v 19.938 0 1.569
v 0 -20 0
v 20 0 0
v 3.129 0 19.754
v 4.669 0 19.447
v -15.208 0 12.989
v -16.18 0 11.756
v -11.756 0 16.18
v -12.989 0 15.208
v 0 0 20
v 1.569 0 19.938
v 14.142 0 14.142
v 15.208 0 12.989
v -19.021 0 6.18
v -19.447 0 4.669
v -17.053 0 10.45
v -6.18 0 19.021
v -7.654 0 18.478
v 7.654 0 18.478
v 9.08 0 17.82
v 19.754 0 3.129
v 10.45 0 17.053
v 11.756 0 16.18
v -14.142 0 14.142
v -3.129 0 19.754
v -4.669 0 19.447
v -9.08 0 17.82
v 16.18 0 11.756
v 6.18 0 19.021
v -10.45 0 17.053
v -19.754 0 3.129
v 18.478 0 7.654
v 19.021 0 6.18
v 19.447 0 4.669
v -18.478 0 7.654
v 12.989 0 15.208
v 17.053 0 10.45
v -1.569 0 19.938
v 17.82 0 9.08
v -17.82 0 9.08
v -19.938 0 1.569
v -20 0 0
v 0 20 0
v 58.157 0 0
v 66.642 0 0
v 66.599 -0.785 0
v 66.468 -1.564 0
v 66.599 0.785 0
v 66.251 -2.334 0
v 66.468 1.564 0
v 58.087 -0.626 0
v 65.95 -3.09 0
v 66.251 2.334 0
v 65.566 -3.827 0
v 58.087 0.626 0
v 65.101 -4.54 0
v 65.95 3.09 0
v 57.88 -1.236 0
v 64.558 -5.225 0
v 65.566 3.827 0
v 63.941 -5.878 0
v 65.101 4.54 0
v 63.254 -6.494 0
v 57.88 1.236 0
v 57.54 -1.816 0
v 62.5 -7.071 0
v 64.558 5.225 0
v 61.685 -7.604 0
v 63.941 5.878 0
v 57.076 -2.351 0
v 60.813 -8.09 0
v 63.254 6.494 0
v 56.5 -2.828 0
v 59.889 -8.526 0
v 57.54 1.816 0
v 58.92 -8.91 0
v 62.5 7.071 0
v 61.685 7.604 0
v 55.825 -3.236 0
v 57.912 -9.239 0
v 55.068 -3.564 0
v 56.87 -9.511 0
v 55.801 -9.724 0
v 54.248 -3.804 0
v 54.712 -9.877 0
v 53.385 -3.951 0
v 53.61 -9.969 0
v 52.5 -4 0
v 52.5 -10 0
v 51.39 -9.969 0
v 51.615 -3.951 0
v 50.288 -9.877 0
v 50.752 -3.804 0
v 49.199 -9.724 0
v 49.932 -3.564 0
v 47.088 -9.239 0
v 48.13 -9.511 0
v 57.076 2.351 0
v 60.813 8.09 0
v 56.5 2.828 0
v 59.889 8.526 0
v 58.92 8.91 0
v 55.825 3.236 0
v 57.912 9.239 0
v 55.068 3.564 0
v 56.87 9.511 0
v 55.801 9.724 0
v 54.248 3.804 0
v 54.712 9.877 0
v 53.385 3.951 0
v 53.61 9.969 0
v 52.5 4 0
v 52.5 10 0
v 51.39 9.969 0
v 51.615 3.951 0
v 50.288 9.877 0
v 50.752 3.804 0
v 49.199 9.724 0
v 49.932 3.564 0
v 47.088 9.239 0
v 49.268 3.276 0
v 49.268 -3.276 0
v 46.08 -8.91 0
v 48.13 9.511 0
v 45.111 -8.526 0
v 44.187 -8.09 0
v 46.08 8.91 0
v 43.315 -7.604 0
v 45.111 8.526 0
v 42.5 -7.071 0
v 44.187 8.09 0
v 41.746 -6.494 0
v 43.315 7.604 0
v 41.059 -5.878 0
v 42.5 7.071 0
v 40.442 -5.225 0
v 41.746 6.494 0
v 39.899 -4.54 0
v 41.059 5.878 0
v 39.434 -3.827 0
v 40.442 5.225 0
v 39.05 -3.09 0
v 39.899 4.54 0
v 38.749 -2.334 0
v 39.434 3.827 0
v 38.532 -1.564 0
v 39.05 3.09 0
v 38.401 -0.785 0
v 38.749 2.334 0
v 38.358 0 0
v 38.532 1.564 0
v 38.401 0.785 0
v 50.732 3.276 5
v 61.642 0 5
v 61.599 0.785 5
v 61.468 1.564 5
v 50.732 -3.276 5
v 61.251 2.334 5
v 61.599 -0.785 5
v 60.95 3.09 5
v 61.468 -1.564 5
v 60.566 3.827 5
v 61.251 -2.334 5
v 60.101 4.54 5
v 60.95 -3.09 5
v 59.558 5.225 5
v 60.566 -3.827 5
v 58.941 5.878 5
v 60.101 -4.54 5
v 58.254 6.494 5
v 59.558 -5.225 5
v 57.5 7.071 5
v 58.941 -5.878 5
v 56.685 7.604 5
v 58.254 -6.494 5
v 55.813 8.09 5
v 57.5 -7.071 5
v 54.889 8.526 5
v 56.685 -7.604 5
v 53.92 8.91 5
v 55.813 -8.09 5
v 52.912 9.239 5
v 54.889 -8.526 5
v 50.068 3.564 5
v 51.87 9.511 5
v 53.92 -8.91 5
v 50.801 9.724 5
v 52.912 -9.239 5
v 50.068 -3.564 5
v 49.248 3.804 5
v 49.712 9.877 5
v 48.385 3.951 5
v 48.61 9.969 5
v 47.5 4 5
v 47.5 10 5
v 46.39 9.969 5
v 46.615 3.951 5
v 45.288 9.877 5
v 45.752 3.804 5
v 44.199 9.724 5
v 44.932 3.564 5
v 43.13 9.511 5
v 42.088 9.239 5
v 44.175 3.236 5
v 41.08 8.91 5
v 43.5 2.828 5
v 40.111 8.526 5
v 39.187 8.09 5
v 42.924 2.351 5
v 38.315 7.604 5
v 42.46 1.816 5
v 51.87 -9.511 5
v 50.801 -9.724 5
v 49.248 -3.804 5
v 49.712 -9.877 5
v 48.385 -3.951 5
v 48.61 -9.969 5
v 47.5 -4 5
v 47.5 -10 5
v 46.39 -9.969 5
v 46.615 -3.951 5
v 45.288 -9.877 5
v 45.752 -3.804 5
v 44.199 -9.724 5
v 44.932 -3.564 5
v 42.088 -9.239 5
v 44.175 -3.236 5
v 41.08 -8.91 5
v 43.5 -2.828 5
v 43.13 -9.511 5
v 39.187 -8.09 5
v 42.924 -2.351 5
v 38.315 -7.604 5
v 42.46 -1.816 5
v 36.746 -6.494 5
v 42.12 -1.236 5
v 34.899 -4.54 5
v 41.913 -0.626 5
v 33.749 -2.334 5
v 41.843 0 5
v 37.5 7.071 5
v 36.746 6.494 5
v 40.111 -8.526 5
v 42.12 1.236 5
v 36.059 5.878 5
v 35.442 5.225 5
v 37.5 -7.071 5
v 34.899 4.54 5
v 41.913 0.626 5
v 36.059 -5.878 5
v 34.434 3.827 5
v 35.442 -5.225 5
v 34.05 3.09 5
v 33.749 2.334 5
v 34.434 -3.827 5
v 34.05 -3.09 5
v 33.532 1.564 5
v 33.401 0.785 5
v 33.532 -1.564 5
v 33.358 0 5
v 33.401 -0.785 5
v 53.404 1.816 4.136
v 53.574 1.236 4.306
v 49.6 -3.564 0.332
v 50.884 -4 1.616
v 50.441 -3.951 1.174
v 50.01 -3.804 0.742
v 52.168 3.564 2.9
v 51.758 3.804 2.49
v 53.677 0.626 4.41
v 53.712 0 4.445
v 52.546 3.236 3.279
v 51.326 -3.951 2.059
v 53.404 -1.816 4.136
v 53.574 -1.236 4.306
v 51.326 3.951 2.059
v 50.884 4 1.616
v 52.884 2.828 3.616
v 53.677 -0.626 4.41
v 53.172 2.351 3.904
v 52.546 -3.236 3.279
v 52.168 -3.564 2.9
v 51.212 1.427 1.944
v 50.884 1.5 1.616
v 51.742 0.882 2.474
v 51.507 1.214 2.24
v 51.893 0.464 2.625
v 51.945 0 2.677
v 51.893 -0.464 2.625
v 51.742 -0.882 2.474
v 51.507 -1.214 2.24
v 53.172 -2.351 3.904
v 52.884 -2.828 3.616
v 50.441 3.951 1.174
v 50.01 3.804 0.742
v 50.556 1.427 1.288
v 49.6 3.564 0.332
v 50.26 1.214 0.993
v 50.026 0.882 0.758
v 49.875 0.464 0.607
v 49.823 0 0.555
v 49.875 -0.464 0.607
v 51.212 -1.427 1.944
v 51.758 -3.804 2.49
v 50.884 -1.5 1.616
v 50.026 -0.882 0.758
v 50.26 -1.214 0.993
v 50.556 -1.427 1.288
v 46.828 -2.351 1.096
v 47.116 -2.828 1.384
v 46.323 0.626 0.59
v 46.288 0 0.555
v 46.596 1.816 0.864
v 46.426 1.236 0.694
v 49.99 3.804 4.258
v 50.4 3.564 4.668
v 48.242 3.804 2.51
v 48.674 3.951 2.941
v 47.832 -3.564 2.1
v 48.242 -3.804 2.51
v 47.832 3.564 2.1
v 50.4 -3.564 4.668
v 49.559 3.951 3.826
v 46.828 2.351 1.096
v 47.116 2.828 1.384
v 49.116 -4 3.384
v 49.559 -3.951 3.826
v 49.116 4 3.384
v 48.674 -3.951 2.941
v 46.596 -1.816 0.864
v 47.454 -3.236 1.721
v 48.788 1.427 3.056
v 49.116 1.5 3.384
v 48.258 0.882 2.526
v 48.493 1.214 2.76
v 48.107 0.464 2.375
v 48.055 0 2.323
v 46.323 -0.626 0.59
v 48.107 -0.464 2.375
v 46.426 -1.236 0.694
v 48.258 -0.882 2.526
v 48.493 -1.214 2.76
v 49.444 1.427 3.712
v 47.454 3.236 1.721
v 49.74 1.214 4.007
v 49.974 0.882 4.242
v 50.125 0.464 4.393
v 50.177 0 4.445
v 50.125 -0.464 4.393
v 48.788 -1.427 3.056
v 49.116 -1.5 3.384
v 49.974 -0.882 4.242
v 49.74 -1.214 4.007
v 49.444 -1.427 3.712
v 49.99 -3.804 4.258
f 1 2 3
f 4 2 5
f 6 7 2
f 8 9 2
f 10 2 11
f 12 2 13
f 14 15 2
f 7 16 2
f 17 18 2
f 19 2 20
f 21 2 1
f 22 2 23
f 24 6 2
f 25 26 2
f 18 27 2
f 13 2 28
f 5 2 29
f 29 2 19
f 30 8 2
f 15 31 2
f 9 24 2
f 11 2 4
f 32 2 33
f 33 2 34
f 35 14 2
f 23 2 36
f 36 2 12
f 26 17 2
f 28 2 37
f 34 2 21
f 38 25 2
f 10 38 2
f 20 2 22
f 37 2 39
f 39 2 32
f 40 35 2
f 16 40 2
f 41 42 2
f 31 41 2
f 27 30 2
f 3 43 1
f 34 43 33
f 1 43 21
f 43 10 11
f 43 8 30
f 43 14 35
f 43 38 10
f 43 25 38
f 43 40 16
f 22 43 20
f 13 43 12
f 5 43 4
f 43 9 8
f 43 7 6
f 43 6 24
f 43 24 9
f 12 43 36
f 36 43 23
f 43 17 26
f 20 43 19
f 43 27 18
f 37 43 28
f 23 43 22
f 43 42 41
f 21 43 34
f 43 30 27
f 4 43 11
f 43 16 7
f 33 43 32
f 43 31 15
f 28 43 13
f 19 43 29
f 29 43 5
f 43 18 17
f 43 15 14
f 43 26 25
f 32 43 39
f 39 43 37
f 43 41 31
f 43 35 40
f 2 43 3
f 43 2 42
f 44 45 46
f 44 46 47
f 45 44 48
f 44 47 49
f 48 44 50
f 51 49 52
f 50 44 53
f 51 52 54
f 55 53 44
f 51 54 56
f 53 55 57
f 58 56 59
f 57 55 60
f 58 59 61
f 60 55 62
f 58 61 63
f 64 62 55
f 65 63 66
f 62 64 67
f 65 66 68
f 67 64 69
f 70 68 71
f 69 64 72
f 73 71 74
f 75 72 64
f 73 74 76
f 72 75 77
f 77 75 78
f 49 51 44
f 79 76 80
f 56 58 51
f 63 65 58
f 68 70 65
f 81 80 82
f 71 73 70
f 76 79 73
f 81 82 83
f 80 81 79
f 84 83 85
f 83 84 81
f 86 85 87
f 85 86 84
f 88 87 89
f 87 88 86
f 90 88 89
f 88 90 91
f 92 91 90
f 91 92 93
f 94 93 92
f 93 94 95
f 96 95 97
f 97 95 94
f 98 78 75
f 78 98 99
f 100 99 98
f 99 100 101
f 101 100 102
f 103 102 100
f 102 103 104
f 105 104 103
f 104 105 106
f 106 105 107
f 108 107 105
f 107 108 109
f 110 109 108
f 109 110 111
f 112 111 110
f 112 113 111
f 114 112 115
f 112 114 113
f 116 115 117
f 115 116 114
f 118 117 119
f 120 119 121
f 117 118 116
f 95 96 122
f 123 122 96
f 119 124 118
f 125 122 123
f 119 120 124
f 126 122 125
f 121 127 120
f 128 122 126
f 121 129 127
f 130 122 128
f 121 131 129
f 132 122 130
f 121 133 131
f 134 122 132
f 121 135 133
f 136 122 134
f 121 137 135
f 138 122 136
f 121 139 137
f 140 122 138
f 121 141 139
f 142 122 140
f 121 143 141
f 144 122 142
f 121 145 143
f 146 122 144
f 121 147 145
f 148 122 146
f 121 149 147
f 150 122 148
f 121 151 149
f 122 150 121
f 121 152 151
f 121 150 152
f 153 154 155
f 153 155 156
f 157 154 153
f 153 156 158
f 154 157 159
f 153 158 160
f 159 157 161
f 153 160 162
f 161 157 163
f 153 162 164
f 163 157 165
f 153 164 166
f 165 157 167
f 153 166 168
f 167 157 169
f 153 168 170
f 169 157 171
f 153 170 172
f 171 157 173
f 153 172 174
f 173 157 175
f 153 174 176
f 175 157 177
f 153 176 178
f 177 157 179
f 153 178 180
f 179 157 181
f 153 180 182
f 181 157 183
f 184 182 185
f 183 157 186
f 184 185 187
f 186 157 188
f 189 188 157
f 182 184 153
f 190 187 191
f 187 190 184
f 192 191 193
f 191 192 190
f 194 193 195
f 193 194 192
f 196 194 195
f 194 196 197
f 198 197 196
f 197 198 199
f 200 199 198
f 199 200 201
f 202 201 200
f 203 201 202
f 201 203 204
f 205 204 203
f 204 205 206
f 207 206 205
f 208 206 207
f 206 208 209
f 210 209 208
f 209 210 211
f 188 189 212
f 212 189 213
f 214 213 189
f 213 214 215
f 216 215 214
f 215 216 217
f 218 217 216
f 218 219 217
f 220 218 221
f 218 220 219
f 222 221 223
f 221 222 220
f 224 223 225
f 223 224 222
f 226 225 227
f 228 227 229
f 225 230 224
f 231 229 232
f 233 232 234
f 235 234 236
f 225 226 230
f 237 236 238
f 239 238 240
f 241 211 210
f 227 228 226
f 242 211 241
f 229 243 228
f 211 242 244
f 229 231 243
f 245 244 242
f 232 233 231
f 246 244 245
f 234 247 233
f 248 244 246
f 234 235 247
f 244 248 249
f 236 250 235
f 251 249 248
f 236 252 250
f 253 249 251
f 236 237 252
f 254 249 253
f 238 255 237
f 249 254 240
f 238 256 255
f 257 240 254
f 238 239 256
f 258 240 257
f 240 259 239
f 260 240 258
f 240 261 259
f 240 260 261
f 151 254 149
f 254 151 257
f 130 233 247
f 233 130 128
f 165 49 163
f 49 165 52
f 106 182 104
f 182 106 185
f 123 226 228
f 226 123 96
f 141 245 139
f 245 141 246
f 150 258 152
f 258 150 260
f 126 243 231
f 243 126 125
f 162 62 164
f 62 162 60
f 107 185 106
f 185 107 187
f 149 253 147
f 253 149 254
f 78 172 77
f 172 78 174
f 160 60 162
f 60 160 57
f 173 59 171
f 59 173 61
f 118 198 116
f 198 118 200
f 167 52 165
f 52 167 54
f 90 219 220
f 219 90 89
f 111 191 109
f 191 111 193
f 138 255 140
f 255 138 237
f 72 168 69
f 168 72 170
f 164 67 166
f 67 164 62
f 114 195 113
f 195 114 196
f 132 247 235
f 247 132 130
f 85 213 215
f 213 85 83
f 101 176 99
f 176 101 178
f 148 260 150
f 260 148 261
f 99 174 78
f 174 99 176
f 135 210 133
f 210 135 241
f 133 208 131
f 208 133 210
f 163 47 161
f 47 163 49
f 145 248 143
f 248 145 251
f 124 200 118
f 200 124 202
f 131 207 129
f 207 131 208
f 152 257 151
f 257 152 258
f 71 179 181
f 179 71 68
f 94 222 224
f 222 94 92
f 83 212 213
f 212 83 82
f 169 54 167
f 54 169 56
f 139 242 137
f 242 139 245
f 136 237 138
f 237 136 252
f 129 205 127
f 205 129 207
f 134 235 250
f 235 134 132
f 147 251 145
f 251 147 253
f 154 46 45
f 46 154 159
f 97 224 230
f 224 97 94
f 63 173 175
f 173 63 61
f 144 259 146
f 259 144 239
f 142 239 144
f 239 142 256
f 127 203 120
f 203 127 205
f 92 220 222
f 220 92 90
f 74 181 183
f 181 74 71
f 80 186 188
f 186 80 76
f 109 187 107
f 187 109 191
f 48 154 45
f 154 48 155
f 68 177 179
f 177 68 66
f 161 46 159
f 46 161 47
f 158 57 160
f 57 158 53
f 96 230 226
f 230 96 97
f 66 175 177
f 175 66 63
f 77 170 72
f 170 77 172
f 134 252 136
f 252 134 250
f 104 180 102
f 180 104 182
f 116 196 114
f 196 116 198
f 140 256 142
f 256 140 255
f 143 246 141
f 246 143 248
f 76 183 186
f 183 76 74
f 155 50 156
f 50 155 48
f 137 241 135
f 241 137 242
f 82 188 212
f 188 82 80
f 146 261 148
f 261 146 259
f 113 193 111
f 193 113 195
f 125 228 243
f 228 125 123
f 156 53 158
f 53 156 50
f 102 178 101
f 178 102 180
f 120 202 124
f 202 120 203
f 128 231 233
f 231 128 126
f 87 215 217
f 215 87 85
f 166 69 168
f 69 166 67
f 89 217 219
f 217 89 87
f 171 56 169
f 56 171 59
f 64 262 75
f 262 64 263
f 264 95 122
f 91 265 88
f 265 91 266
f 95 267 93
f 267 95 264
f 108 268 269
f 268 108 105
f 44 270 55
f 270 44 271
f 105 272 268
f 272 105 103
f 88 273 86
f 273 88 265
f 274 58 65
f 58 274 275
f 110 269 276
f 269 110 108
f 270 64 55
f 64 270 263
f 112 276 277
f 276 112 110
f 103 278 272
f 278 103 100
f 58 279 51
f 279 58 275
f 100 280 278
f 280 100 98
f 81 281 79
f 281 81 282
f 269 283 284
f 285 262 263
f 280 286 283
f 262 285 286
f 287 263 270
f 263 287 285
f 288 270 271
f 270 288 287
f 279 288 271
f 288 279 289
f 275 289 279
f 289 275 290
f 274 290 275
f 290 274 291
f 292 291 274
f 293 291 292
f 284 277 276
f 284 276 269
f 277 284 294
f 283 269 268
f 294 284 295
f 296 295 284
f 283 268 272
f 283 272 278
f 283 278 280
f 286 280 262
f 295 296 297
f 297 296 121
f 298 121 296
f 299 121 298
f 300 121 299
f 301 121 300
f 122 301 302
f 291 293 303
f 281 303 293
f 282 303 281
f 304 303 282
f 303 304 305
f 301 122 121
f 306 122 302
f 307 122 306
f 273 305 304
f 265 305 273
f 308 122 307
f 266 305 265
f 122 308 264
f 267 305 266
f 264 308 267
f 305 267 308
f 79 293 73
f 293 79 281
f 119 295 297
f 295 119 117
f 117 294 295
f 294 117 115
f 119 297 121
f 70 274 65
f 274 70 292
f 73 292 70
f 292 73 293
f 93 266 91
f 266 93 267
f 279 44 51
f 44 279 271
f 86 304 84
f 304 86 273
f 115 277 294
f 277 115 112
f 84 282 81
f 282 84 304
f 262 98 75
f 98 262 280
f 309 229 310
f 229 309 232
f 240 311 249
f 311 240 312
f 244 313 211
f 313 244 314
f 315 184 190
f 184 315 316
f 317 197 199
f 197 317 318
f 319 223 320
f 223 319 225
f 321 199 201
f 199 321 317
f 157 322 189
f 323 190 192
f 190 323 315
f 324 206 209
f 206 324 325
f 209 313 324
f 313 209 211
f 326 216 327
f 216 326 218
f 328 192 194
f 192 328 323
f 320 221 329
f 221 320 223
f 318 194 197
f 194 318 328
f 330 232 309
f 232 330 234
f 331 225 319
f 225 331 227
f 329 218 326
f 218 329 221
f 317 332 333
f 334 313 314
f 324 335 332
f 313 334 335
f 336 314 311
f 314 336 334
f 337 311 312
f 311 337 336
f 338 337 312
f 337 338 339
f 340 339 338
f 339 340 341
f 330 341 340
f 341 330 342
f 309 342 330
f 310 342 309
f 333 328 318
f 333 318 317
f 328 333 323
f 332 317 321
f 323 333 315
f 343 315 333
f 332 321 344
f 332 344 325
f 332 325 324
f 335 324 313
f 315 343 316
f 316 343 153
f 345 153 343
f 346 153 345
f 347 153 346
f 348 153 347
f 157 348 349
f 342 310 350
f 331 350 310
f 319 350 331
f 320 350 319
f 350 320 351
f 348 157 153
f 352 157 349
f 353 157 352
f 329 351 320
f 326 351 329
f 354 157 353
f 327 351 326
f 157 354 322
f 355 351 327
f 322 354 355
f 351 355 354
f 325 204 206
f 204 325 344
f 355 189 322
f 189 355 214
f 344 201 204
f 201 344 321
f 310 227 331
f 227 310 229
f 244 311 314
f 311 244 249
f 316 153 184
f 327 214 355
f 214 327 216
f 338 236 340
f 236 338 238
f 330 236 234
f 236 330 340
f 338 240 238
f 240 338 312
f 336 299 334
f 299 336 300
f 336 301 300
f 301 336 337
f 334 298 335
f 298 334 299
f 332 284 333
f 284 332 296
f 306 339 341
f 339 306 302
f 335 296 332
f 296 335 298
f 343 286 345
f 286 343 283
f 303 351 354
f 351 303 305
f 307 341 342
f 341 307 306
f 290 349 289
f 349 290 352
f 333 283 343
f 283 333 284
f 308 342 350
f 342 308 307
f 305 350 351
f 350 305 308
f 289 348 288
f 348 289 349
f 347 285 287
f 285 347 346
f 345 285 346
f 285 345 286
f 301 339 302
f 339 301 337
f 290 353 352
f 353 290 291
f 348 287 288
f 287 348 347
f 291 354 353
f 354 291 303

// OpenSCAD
rotate([90,0]) sphericon(0);
translate([50,0,2.5]) rotate([0,45]) wobbler(thick=5);
module sphericon(both=1) {
  for(side=both?[0,1]:[0]) intersection() {
    mirror([0,side,0]) translate([-20,0,-20]) cube(40);
    rotate([0,side*90,0]) for(m=[0,1]) mirror([0,0,m]) cylinder(d1=40,d2=0,h=20,$fn=80);
  }
}

module wobbler(slice_r=45,thick=10) {
  difference()
  {
    intersection() {
      rotate([0,slice_r]) cube([thick,30,50],center=true);
      rotate([0,90]) cylinder(d=20,h=thick*10,center=true,$fn=80);
    }
    rotate([0,90]) {
      cylinder(d=3,h=20,center=true,$fn=20);
      for(m=[0,1]) mirror([0,0,m]) translate([0,0,thick/4]) cylinder(d=8,h=thick*2,$fn=40);
    }
  }
}
